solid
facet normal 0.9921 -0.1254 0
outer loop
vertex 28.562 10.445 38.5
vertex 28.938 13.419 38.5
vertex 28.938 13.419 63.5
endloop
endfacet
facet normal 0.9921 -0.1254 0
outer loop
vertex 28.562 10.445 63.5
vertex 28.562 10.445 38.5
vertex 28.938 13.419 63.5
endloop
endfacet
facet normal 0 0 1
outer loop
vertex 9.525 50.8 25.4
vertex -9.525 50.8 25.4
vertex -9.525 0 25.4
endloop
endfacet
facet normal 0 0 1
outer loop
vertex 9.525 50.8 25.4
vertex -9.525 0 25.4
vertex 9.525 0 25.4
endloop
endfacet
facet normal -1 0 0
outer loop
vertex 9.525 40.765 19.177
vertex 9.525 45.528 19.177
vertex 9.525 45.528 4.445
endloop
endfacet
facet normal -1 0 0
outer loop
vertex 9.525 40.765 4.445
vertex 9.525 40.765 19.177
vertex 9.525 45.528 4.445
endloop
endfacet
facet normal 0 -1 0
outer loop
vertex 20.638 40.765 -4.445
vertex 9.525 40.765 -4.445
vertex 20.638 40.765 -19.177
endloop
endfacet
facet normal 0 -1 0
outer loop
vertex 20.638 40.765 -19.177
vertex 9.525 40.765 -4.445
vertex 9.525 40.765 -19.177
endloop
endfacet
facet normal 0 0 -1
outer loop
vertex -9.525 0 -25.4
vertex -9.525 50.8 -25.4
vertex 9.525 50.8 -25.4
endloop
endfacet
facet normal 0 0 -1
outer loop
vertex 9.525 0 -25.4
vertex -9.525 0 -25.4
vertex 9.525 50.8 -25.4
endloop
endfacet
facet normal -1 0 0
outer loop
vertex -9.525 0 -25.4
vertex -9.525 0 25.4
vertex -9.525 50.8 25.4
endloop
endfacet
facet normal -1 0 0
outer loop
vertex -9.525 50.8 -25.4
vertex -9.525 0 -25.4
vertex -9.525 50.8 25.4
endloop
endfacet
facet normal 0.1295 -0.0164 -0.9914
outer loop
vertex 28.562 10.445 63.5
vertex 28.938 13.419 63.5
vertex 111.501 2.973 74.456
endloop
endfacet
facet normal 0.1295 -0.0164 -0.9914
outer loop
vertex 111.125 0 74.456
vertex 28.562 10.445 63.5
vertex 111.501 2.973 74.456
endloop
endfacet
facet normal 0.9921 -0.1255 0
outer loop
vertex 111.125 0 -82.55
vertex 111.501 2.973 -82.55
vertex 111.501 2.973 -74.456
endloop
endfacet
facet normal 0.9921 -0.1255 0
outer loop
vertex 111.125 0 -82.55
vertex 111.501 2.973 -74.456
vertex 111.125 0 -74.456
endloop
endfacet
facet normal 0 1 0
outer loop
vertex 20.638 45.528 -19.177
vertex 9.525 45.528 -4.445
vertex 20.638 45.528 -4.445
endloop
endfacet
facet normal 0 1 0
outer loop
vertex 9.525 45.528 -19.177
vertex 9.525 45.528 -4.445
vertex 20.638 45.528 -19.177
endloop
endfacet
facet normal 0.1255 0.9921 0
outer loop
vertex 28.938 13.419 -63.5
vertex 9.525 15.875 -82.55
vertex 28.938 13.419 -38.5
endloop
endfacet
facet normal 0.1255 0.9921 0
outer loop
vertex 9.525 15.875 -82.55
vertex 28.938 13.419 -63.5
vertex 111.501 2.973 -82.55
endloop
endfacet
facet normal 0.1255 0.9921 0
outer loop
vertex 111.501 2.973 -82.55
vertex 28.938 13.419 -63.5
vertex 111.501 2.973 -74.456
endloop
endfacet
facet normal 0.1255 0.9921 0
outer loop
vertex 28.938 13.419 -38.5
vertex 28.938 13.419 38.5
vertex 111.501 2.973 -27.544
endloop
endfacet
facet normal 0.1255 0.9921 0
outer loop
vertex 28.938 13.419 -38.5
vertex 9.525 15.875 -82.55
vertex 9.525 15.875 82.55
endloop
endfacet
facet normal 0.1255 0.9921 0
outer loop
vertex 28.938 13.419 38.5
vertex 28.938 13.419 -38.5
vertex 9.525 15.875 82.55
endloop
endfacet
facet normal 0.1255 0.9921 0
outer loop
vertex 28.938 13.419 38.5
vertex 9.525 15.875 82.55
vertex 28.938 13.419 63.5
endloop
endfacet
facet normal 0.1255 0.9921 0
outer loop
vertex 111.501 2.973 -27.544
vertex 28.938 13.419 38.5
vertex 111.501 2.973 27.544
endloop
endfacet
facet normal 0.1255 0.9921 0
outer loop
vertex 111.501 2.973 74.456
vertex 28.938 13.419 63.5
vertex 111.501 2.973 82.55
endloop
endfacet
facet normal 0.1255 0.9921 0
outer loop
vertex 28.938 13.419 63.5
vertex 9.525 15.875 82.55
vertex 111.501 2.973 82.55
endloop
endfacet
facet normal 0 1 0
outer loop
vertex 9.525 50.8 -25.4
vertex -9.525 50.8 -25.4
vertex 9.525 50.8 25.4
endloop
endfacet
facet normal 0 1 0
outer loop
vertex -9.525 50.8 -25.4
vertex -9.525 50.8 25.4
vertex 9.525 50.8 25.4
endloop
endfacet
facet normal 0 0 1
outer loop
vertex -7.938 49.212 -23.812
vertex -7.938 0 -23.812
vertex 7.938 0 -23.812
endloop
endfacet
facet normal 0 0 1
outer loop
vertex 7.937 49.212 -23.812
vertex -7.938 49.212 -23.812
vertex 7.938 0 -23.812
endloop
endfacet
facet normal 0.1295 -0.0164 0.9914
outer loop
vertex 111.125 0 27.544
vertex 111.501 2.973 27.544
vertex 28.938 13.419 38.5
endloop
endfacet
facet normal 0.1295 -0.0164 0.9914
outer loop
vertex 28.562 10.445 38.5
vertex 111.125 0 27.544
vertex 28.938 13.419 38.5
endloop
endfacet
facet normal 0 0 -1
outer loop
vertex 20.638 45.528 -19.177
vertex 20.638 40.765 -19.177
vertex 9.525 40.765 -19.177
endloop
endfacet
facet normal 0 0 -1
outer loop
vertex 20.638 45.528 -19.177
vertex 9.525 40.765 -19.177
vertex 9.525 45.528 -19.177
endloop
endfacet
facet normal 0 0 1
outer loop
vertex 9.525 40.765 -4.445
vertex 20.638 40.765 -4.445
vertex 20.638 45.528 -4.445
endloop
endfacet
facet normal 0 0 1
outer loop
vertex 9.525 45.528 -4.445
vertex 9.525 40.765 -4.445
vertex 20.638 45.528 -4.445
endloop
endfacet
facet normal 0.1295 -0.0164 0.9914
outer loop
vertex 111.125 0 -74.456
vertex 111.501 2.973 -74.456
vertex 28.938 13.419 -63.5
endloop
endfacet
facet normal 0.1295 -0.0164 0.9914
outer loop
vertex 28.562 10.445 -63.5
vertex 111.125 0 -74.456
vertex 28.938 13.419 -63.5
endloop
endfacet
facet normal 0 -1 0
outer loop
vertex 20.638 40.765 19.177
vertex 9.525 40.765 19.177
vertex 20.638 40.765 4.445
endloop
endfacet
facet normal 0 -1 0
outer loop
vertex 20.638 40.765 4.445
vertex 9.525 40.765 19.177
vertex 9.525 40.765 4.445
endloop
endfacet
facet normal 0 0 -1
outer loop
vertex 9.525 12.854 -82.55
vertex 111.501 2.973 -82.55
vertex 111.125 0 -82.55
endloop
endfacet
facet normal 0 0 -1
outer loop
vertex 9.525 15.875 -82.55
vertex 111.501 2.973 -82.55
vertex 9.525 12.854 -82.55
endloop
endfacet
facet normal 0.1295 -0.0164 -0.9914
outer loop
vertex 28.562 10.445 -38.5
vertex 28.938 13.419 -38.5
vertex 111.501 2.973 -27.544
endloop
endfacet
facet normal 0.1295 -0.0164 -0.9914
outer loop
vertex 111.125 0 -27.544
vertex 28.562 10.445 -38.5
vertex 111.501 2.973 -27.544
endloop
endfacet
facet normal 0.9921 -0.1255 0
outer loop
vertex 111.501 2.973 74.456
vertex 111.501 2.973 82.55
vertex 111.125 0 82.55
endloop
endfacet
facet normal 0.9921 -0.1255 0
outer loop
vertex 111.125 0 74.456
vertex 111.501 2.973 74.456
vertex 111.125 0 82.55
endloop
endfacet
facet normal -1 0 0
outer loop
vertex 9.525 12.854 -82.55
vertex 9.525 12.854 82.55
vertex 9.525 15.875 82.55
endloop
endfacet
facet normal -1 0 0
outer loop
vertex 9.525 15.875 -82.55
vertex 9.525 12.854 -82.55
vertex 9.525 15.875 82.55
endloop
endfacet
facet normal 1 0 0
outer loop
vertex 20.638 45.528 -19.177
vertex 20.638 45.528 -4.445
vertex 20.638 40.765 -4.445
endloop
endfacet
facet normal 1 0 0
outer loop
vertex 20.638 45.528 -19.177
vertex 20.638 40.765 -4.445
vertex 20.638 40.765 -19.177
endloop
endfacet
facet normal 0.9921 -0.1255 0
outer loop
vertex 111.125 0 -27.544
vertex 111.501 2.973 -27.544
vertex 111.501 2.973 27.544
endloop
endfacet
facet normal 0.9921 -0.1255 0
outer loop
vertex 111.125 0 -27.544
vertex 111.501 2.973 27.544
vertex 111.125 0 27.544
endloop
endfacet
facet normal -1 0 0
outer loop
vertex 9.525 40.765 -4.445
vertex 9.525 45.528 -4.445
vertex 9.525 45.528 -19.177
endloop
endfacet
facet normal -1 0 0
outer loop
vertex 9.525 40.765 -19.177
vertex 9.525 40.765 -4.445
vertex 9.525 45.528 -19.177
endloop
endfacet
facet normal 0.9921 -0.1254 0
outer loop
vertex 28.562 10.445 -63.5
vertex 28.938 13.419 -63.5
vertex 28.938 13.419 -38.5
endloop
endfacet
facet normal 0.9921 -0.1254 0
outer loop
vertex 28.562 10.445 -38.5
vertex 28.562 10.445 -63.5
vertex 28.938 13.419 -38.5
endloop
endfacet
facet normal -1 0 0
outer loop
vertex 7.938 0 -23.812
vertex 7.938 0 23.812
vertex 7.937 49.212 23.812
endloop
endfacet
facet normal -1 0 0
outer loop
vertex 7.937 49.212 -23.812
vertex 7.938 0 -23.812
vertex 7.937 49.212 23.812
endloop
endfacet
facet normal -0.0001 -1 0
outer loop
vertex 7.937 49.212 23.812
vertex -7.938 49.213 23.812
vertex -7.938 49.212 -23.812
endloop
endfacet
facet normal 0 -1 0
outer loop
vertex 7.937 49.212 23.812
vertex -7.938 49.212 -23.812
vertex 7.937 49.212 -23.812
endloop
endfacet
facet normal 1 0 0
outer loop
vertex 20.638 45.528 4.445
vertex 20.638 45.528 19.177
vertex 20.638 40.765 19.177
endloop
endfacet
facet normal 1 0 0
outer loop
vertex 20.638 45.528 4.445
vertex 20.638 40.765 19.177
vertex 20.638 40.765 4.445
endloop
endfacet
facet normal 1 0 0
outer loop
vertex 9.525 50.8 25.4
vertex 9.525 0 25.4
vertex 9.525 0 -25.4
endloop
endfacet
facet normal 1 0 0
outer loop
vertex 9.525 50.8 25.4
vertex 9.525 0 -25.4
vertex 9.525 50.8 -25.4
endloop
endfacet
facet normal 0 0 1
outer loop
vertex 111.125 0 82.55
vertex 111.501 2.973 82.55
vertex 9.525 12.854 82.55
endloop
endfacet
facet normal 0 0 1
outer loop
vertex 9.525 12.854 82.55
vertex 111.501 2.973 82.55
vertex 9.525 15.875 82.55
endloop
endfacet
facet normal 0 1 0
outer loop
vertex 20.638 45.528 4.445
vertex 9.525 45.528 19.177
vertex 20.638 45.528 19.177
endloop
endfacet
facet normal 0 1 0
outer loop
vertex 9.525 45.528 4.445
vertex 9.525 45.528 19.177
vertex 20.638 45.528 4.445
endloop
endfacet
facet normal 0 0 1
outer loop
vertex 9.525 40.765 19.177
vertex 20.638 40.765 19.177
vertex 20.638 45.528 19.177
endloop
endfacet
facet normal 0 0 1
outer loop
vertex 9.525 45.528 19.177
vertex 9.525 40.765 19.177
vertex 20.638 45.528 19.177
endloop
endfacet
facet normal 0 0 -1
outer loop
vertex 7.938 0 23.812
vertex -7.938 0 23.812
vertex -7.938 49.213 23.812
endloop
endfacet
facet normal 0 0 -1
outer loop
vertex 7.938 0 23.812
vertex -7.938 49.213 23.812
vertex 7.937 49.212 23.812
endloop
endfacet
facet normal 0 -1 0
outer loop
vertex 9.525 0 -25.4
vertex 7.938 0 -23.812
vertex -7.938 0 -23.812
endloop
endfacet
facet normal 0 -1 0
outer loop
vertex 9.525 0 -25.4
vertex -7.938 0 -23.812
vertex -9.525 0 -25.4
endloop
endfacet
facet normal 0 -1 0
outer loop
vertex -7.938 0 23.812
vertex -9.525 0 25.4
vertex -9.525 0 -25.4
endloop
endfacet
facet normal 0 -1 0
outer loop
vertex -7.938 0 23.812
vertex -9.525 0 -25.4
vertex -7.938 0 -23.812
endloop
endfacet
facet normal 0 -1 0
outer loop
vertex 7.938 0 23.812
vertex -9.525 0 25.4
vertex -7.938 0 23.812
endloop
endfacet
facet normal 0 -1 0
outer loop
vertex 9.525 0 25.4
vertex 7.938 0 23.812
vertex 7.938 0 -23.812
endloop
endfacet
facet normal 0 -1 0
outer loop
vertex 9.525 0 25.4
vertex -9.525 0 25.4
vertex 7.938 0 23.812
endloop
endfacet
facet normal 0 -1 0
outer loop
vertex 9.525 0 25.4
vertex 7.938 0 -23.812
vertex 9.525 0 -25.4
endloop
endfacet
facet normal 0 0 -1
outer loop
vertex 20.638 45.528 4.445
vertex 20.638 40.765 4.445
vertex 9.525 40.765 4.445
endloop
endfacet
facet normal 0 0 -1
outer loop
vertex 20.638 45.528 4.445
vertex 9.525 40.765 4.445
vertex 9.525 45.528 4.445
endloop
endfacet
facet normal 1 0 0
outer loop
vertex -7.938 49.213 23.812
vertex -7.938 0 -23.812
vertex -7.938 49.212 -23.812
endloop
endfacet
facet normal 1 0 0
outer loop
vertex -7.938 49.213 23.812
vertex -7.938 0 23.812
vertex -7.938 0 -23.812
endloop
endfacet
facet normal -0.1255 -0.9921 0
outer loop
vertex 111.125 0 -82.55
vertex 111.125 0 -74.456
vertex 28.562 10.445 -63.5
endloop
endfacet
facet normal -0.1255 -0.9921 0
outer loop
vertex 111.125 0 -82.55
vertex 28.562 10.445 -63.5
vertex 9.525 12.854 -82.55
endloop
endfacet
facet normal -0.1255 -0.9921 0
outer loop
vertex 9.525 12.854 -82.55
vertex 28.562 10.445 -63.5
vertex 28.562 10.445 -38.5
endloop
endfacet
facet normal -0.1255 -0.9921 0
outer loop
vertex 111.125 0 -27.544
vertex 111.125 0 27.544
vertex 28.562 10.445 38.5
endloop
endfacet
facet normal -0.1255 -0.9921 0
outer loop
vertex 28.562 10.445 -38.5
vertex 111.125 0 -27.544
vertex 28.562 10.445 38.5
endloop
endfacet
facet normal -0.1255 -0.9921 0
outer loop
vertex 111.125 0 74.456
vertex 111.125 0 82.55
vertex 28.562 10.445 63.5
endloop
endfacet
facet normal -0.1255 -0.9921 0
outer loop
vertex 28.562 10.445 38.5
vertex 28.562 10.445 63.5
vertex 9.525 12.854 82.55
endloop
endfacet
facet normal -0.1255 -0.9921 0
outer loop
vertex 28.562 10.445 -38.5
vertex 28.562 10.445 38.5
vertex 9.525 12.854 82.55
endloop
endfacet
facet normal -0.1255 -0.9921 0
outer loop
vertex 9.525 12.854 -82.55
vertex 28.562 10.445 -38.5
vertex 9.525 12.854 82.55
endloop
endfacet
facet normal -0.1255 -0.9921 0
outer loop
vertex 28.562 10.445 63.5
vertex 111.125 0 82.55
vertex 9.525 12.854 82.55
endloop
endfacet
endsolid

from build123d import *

# Parameters (mm, degrees)
SKETCH1_W        = 19.05
SKETCH1_H        = 50.8
EXTRUDE1_DEPTH   = 25.4
SHELL1_T         = -1.5875
EXTRUDE3_DEPTH   = 82.55
EXTRUDE4_DEPTH   = 25
SKETCH5_W        = 14.732
SKETCH5_H        = 4.7625
EXTRUDE5_DEPTH   = 11.1125
EXTRUDE5_2_DEPTH = 11.1125
EXTRUDE10_DEPTH  = 2.9972


with BuildPart() as part:
    # Sketch1 → Extrude1 (new body, symmetric)
    with BuildSketch(Plane.XY):
        with Locations((0, 25.4)):
            Rectangle(SKETCH1_W, SKETCH1_H)
    extrude(amount=EXTRUDE1_DEPTH, both=True)

    # Shell1
    shell1_openings = [part.faces().sort_by_distance(p)[0] for p in [
        (0, 0, 0),
    ]]
    offset(amount=SHELL1_T, openings=shell1_openings, kind=Kind.INTERSECTION)


with BuildPart() as body_2:
    # Sketch3 → Extrude3 (new body, symmetric)
    with BuildSketch(Plane.XY):
        Polygon((9.525, 15.875), (111.501191593, 2.973497558), (111.125, 0), (9.525, 12.85390862), align=None)
    extrude(amount=EXTRUDE3_DEPTH, both=True)

    # Sketch4 → Extrude4 (cut)
    with BuildSketch(Plane.XY.offset(63.5)):
        with BuildLine():
            Line((63.337117092, 9.066968152), (28.938004512, 13.418966673))
            ThreePointArc((28.938004512, 13.418966673), (44.989198765, 2.166072097), (63.337117092, 9.066968152))
        make_face()
    extrude4 = extrude(amount=-EXTRUDE4_DEPTH, mode=Mode.SUBTRACT)

    # Mirror1: Extrude4 across plane
    add(extrude4.mirror(Plane.XY), mode=Mode.SUBTRACT)

    # Sketch9 → Extrude10 (cut)
    with BuildSketch(Plane(origin=(2.12683825, 16.810977314, 0), x_dir=(0.992091805, -0.125514345, 0), z_dir=(0.125514345, 0.992091805, 0))):
        Polygon((27.02488432, 38.5), (110.246201818, 27.543705699), (110.246201818, 74.456294301), (27.02488432, 63.5), align=None)
        Polygon((27.02488432, -63.5), (110.246201818, -74.456294301), (110.246201818, -27.543705699), (27.02488432, -38.5), align=None)
    extrude(amount=-EXTRUDE10_DEPTH, mode=Mode.SUBTRACT)


with BuildPart() as body_3:
    # Sketch5 → Extrude5 (new body)
    with BuildSketch(Plane(origin=(9.525, 0, 0), x_dir=(0, 0, -1), z_dir=(1, 0, 0))):
        with Locations((-11.811, 43.146500004)):
            Rectangle(SKETCH5_W, SKETCH5_H)
    extrude(amount=EXTRUDE5_DEPTH)


with BuildPart() as body_4:
    # Sketch5 → Extrude5 2 (new body)
    with BuildSketch(Plane(origin=(9.525, 0, 0), x_dir=(0, 0, -1), z_dir=(1, 0, 0))):
        with Locations((11.811, 43.146500004)):
            Rectangle(SKETCH5_W, SKETCH5_H)
    extrude(amount=EXTRUDE5_2_DEPTH)


solid = Compound([part.part, body_2.part, body_3.part, body_4.part])
